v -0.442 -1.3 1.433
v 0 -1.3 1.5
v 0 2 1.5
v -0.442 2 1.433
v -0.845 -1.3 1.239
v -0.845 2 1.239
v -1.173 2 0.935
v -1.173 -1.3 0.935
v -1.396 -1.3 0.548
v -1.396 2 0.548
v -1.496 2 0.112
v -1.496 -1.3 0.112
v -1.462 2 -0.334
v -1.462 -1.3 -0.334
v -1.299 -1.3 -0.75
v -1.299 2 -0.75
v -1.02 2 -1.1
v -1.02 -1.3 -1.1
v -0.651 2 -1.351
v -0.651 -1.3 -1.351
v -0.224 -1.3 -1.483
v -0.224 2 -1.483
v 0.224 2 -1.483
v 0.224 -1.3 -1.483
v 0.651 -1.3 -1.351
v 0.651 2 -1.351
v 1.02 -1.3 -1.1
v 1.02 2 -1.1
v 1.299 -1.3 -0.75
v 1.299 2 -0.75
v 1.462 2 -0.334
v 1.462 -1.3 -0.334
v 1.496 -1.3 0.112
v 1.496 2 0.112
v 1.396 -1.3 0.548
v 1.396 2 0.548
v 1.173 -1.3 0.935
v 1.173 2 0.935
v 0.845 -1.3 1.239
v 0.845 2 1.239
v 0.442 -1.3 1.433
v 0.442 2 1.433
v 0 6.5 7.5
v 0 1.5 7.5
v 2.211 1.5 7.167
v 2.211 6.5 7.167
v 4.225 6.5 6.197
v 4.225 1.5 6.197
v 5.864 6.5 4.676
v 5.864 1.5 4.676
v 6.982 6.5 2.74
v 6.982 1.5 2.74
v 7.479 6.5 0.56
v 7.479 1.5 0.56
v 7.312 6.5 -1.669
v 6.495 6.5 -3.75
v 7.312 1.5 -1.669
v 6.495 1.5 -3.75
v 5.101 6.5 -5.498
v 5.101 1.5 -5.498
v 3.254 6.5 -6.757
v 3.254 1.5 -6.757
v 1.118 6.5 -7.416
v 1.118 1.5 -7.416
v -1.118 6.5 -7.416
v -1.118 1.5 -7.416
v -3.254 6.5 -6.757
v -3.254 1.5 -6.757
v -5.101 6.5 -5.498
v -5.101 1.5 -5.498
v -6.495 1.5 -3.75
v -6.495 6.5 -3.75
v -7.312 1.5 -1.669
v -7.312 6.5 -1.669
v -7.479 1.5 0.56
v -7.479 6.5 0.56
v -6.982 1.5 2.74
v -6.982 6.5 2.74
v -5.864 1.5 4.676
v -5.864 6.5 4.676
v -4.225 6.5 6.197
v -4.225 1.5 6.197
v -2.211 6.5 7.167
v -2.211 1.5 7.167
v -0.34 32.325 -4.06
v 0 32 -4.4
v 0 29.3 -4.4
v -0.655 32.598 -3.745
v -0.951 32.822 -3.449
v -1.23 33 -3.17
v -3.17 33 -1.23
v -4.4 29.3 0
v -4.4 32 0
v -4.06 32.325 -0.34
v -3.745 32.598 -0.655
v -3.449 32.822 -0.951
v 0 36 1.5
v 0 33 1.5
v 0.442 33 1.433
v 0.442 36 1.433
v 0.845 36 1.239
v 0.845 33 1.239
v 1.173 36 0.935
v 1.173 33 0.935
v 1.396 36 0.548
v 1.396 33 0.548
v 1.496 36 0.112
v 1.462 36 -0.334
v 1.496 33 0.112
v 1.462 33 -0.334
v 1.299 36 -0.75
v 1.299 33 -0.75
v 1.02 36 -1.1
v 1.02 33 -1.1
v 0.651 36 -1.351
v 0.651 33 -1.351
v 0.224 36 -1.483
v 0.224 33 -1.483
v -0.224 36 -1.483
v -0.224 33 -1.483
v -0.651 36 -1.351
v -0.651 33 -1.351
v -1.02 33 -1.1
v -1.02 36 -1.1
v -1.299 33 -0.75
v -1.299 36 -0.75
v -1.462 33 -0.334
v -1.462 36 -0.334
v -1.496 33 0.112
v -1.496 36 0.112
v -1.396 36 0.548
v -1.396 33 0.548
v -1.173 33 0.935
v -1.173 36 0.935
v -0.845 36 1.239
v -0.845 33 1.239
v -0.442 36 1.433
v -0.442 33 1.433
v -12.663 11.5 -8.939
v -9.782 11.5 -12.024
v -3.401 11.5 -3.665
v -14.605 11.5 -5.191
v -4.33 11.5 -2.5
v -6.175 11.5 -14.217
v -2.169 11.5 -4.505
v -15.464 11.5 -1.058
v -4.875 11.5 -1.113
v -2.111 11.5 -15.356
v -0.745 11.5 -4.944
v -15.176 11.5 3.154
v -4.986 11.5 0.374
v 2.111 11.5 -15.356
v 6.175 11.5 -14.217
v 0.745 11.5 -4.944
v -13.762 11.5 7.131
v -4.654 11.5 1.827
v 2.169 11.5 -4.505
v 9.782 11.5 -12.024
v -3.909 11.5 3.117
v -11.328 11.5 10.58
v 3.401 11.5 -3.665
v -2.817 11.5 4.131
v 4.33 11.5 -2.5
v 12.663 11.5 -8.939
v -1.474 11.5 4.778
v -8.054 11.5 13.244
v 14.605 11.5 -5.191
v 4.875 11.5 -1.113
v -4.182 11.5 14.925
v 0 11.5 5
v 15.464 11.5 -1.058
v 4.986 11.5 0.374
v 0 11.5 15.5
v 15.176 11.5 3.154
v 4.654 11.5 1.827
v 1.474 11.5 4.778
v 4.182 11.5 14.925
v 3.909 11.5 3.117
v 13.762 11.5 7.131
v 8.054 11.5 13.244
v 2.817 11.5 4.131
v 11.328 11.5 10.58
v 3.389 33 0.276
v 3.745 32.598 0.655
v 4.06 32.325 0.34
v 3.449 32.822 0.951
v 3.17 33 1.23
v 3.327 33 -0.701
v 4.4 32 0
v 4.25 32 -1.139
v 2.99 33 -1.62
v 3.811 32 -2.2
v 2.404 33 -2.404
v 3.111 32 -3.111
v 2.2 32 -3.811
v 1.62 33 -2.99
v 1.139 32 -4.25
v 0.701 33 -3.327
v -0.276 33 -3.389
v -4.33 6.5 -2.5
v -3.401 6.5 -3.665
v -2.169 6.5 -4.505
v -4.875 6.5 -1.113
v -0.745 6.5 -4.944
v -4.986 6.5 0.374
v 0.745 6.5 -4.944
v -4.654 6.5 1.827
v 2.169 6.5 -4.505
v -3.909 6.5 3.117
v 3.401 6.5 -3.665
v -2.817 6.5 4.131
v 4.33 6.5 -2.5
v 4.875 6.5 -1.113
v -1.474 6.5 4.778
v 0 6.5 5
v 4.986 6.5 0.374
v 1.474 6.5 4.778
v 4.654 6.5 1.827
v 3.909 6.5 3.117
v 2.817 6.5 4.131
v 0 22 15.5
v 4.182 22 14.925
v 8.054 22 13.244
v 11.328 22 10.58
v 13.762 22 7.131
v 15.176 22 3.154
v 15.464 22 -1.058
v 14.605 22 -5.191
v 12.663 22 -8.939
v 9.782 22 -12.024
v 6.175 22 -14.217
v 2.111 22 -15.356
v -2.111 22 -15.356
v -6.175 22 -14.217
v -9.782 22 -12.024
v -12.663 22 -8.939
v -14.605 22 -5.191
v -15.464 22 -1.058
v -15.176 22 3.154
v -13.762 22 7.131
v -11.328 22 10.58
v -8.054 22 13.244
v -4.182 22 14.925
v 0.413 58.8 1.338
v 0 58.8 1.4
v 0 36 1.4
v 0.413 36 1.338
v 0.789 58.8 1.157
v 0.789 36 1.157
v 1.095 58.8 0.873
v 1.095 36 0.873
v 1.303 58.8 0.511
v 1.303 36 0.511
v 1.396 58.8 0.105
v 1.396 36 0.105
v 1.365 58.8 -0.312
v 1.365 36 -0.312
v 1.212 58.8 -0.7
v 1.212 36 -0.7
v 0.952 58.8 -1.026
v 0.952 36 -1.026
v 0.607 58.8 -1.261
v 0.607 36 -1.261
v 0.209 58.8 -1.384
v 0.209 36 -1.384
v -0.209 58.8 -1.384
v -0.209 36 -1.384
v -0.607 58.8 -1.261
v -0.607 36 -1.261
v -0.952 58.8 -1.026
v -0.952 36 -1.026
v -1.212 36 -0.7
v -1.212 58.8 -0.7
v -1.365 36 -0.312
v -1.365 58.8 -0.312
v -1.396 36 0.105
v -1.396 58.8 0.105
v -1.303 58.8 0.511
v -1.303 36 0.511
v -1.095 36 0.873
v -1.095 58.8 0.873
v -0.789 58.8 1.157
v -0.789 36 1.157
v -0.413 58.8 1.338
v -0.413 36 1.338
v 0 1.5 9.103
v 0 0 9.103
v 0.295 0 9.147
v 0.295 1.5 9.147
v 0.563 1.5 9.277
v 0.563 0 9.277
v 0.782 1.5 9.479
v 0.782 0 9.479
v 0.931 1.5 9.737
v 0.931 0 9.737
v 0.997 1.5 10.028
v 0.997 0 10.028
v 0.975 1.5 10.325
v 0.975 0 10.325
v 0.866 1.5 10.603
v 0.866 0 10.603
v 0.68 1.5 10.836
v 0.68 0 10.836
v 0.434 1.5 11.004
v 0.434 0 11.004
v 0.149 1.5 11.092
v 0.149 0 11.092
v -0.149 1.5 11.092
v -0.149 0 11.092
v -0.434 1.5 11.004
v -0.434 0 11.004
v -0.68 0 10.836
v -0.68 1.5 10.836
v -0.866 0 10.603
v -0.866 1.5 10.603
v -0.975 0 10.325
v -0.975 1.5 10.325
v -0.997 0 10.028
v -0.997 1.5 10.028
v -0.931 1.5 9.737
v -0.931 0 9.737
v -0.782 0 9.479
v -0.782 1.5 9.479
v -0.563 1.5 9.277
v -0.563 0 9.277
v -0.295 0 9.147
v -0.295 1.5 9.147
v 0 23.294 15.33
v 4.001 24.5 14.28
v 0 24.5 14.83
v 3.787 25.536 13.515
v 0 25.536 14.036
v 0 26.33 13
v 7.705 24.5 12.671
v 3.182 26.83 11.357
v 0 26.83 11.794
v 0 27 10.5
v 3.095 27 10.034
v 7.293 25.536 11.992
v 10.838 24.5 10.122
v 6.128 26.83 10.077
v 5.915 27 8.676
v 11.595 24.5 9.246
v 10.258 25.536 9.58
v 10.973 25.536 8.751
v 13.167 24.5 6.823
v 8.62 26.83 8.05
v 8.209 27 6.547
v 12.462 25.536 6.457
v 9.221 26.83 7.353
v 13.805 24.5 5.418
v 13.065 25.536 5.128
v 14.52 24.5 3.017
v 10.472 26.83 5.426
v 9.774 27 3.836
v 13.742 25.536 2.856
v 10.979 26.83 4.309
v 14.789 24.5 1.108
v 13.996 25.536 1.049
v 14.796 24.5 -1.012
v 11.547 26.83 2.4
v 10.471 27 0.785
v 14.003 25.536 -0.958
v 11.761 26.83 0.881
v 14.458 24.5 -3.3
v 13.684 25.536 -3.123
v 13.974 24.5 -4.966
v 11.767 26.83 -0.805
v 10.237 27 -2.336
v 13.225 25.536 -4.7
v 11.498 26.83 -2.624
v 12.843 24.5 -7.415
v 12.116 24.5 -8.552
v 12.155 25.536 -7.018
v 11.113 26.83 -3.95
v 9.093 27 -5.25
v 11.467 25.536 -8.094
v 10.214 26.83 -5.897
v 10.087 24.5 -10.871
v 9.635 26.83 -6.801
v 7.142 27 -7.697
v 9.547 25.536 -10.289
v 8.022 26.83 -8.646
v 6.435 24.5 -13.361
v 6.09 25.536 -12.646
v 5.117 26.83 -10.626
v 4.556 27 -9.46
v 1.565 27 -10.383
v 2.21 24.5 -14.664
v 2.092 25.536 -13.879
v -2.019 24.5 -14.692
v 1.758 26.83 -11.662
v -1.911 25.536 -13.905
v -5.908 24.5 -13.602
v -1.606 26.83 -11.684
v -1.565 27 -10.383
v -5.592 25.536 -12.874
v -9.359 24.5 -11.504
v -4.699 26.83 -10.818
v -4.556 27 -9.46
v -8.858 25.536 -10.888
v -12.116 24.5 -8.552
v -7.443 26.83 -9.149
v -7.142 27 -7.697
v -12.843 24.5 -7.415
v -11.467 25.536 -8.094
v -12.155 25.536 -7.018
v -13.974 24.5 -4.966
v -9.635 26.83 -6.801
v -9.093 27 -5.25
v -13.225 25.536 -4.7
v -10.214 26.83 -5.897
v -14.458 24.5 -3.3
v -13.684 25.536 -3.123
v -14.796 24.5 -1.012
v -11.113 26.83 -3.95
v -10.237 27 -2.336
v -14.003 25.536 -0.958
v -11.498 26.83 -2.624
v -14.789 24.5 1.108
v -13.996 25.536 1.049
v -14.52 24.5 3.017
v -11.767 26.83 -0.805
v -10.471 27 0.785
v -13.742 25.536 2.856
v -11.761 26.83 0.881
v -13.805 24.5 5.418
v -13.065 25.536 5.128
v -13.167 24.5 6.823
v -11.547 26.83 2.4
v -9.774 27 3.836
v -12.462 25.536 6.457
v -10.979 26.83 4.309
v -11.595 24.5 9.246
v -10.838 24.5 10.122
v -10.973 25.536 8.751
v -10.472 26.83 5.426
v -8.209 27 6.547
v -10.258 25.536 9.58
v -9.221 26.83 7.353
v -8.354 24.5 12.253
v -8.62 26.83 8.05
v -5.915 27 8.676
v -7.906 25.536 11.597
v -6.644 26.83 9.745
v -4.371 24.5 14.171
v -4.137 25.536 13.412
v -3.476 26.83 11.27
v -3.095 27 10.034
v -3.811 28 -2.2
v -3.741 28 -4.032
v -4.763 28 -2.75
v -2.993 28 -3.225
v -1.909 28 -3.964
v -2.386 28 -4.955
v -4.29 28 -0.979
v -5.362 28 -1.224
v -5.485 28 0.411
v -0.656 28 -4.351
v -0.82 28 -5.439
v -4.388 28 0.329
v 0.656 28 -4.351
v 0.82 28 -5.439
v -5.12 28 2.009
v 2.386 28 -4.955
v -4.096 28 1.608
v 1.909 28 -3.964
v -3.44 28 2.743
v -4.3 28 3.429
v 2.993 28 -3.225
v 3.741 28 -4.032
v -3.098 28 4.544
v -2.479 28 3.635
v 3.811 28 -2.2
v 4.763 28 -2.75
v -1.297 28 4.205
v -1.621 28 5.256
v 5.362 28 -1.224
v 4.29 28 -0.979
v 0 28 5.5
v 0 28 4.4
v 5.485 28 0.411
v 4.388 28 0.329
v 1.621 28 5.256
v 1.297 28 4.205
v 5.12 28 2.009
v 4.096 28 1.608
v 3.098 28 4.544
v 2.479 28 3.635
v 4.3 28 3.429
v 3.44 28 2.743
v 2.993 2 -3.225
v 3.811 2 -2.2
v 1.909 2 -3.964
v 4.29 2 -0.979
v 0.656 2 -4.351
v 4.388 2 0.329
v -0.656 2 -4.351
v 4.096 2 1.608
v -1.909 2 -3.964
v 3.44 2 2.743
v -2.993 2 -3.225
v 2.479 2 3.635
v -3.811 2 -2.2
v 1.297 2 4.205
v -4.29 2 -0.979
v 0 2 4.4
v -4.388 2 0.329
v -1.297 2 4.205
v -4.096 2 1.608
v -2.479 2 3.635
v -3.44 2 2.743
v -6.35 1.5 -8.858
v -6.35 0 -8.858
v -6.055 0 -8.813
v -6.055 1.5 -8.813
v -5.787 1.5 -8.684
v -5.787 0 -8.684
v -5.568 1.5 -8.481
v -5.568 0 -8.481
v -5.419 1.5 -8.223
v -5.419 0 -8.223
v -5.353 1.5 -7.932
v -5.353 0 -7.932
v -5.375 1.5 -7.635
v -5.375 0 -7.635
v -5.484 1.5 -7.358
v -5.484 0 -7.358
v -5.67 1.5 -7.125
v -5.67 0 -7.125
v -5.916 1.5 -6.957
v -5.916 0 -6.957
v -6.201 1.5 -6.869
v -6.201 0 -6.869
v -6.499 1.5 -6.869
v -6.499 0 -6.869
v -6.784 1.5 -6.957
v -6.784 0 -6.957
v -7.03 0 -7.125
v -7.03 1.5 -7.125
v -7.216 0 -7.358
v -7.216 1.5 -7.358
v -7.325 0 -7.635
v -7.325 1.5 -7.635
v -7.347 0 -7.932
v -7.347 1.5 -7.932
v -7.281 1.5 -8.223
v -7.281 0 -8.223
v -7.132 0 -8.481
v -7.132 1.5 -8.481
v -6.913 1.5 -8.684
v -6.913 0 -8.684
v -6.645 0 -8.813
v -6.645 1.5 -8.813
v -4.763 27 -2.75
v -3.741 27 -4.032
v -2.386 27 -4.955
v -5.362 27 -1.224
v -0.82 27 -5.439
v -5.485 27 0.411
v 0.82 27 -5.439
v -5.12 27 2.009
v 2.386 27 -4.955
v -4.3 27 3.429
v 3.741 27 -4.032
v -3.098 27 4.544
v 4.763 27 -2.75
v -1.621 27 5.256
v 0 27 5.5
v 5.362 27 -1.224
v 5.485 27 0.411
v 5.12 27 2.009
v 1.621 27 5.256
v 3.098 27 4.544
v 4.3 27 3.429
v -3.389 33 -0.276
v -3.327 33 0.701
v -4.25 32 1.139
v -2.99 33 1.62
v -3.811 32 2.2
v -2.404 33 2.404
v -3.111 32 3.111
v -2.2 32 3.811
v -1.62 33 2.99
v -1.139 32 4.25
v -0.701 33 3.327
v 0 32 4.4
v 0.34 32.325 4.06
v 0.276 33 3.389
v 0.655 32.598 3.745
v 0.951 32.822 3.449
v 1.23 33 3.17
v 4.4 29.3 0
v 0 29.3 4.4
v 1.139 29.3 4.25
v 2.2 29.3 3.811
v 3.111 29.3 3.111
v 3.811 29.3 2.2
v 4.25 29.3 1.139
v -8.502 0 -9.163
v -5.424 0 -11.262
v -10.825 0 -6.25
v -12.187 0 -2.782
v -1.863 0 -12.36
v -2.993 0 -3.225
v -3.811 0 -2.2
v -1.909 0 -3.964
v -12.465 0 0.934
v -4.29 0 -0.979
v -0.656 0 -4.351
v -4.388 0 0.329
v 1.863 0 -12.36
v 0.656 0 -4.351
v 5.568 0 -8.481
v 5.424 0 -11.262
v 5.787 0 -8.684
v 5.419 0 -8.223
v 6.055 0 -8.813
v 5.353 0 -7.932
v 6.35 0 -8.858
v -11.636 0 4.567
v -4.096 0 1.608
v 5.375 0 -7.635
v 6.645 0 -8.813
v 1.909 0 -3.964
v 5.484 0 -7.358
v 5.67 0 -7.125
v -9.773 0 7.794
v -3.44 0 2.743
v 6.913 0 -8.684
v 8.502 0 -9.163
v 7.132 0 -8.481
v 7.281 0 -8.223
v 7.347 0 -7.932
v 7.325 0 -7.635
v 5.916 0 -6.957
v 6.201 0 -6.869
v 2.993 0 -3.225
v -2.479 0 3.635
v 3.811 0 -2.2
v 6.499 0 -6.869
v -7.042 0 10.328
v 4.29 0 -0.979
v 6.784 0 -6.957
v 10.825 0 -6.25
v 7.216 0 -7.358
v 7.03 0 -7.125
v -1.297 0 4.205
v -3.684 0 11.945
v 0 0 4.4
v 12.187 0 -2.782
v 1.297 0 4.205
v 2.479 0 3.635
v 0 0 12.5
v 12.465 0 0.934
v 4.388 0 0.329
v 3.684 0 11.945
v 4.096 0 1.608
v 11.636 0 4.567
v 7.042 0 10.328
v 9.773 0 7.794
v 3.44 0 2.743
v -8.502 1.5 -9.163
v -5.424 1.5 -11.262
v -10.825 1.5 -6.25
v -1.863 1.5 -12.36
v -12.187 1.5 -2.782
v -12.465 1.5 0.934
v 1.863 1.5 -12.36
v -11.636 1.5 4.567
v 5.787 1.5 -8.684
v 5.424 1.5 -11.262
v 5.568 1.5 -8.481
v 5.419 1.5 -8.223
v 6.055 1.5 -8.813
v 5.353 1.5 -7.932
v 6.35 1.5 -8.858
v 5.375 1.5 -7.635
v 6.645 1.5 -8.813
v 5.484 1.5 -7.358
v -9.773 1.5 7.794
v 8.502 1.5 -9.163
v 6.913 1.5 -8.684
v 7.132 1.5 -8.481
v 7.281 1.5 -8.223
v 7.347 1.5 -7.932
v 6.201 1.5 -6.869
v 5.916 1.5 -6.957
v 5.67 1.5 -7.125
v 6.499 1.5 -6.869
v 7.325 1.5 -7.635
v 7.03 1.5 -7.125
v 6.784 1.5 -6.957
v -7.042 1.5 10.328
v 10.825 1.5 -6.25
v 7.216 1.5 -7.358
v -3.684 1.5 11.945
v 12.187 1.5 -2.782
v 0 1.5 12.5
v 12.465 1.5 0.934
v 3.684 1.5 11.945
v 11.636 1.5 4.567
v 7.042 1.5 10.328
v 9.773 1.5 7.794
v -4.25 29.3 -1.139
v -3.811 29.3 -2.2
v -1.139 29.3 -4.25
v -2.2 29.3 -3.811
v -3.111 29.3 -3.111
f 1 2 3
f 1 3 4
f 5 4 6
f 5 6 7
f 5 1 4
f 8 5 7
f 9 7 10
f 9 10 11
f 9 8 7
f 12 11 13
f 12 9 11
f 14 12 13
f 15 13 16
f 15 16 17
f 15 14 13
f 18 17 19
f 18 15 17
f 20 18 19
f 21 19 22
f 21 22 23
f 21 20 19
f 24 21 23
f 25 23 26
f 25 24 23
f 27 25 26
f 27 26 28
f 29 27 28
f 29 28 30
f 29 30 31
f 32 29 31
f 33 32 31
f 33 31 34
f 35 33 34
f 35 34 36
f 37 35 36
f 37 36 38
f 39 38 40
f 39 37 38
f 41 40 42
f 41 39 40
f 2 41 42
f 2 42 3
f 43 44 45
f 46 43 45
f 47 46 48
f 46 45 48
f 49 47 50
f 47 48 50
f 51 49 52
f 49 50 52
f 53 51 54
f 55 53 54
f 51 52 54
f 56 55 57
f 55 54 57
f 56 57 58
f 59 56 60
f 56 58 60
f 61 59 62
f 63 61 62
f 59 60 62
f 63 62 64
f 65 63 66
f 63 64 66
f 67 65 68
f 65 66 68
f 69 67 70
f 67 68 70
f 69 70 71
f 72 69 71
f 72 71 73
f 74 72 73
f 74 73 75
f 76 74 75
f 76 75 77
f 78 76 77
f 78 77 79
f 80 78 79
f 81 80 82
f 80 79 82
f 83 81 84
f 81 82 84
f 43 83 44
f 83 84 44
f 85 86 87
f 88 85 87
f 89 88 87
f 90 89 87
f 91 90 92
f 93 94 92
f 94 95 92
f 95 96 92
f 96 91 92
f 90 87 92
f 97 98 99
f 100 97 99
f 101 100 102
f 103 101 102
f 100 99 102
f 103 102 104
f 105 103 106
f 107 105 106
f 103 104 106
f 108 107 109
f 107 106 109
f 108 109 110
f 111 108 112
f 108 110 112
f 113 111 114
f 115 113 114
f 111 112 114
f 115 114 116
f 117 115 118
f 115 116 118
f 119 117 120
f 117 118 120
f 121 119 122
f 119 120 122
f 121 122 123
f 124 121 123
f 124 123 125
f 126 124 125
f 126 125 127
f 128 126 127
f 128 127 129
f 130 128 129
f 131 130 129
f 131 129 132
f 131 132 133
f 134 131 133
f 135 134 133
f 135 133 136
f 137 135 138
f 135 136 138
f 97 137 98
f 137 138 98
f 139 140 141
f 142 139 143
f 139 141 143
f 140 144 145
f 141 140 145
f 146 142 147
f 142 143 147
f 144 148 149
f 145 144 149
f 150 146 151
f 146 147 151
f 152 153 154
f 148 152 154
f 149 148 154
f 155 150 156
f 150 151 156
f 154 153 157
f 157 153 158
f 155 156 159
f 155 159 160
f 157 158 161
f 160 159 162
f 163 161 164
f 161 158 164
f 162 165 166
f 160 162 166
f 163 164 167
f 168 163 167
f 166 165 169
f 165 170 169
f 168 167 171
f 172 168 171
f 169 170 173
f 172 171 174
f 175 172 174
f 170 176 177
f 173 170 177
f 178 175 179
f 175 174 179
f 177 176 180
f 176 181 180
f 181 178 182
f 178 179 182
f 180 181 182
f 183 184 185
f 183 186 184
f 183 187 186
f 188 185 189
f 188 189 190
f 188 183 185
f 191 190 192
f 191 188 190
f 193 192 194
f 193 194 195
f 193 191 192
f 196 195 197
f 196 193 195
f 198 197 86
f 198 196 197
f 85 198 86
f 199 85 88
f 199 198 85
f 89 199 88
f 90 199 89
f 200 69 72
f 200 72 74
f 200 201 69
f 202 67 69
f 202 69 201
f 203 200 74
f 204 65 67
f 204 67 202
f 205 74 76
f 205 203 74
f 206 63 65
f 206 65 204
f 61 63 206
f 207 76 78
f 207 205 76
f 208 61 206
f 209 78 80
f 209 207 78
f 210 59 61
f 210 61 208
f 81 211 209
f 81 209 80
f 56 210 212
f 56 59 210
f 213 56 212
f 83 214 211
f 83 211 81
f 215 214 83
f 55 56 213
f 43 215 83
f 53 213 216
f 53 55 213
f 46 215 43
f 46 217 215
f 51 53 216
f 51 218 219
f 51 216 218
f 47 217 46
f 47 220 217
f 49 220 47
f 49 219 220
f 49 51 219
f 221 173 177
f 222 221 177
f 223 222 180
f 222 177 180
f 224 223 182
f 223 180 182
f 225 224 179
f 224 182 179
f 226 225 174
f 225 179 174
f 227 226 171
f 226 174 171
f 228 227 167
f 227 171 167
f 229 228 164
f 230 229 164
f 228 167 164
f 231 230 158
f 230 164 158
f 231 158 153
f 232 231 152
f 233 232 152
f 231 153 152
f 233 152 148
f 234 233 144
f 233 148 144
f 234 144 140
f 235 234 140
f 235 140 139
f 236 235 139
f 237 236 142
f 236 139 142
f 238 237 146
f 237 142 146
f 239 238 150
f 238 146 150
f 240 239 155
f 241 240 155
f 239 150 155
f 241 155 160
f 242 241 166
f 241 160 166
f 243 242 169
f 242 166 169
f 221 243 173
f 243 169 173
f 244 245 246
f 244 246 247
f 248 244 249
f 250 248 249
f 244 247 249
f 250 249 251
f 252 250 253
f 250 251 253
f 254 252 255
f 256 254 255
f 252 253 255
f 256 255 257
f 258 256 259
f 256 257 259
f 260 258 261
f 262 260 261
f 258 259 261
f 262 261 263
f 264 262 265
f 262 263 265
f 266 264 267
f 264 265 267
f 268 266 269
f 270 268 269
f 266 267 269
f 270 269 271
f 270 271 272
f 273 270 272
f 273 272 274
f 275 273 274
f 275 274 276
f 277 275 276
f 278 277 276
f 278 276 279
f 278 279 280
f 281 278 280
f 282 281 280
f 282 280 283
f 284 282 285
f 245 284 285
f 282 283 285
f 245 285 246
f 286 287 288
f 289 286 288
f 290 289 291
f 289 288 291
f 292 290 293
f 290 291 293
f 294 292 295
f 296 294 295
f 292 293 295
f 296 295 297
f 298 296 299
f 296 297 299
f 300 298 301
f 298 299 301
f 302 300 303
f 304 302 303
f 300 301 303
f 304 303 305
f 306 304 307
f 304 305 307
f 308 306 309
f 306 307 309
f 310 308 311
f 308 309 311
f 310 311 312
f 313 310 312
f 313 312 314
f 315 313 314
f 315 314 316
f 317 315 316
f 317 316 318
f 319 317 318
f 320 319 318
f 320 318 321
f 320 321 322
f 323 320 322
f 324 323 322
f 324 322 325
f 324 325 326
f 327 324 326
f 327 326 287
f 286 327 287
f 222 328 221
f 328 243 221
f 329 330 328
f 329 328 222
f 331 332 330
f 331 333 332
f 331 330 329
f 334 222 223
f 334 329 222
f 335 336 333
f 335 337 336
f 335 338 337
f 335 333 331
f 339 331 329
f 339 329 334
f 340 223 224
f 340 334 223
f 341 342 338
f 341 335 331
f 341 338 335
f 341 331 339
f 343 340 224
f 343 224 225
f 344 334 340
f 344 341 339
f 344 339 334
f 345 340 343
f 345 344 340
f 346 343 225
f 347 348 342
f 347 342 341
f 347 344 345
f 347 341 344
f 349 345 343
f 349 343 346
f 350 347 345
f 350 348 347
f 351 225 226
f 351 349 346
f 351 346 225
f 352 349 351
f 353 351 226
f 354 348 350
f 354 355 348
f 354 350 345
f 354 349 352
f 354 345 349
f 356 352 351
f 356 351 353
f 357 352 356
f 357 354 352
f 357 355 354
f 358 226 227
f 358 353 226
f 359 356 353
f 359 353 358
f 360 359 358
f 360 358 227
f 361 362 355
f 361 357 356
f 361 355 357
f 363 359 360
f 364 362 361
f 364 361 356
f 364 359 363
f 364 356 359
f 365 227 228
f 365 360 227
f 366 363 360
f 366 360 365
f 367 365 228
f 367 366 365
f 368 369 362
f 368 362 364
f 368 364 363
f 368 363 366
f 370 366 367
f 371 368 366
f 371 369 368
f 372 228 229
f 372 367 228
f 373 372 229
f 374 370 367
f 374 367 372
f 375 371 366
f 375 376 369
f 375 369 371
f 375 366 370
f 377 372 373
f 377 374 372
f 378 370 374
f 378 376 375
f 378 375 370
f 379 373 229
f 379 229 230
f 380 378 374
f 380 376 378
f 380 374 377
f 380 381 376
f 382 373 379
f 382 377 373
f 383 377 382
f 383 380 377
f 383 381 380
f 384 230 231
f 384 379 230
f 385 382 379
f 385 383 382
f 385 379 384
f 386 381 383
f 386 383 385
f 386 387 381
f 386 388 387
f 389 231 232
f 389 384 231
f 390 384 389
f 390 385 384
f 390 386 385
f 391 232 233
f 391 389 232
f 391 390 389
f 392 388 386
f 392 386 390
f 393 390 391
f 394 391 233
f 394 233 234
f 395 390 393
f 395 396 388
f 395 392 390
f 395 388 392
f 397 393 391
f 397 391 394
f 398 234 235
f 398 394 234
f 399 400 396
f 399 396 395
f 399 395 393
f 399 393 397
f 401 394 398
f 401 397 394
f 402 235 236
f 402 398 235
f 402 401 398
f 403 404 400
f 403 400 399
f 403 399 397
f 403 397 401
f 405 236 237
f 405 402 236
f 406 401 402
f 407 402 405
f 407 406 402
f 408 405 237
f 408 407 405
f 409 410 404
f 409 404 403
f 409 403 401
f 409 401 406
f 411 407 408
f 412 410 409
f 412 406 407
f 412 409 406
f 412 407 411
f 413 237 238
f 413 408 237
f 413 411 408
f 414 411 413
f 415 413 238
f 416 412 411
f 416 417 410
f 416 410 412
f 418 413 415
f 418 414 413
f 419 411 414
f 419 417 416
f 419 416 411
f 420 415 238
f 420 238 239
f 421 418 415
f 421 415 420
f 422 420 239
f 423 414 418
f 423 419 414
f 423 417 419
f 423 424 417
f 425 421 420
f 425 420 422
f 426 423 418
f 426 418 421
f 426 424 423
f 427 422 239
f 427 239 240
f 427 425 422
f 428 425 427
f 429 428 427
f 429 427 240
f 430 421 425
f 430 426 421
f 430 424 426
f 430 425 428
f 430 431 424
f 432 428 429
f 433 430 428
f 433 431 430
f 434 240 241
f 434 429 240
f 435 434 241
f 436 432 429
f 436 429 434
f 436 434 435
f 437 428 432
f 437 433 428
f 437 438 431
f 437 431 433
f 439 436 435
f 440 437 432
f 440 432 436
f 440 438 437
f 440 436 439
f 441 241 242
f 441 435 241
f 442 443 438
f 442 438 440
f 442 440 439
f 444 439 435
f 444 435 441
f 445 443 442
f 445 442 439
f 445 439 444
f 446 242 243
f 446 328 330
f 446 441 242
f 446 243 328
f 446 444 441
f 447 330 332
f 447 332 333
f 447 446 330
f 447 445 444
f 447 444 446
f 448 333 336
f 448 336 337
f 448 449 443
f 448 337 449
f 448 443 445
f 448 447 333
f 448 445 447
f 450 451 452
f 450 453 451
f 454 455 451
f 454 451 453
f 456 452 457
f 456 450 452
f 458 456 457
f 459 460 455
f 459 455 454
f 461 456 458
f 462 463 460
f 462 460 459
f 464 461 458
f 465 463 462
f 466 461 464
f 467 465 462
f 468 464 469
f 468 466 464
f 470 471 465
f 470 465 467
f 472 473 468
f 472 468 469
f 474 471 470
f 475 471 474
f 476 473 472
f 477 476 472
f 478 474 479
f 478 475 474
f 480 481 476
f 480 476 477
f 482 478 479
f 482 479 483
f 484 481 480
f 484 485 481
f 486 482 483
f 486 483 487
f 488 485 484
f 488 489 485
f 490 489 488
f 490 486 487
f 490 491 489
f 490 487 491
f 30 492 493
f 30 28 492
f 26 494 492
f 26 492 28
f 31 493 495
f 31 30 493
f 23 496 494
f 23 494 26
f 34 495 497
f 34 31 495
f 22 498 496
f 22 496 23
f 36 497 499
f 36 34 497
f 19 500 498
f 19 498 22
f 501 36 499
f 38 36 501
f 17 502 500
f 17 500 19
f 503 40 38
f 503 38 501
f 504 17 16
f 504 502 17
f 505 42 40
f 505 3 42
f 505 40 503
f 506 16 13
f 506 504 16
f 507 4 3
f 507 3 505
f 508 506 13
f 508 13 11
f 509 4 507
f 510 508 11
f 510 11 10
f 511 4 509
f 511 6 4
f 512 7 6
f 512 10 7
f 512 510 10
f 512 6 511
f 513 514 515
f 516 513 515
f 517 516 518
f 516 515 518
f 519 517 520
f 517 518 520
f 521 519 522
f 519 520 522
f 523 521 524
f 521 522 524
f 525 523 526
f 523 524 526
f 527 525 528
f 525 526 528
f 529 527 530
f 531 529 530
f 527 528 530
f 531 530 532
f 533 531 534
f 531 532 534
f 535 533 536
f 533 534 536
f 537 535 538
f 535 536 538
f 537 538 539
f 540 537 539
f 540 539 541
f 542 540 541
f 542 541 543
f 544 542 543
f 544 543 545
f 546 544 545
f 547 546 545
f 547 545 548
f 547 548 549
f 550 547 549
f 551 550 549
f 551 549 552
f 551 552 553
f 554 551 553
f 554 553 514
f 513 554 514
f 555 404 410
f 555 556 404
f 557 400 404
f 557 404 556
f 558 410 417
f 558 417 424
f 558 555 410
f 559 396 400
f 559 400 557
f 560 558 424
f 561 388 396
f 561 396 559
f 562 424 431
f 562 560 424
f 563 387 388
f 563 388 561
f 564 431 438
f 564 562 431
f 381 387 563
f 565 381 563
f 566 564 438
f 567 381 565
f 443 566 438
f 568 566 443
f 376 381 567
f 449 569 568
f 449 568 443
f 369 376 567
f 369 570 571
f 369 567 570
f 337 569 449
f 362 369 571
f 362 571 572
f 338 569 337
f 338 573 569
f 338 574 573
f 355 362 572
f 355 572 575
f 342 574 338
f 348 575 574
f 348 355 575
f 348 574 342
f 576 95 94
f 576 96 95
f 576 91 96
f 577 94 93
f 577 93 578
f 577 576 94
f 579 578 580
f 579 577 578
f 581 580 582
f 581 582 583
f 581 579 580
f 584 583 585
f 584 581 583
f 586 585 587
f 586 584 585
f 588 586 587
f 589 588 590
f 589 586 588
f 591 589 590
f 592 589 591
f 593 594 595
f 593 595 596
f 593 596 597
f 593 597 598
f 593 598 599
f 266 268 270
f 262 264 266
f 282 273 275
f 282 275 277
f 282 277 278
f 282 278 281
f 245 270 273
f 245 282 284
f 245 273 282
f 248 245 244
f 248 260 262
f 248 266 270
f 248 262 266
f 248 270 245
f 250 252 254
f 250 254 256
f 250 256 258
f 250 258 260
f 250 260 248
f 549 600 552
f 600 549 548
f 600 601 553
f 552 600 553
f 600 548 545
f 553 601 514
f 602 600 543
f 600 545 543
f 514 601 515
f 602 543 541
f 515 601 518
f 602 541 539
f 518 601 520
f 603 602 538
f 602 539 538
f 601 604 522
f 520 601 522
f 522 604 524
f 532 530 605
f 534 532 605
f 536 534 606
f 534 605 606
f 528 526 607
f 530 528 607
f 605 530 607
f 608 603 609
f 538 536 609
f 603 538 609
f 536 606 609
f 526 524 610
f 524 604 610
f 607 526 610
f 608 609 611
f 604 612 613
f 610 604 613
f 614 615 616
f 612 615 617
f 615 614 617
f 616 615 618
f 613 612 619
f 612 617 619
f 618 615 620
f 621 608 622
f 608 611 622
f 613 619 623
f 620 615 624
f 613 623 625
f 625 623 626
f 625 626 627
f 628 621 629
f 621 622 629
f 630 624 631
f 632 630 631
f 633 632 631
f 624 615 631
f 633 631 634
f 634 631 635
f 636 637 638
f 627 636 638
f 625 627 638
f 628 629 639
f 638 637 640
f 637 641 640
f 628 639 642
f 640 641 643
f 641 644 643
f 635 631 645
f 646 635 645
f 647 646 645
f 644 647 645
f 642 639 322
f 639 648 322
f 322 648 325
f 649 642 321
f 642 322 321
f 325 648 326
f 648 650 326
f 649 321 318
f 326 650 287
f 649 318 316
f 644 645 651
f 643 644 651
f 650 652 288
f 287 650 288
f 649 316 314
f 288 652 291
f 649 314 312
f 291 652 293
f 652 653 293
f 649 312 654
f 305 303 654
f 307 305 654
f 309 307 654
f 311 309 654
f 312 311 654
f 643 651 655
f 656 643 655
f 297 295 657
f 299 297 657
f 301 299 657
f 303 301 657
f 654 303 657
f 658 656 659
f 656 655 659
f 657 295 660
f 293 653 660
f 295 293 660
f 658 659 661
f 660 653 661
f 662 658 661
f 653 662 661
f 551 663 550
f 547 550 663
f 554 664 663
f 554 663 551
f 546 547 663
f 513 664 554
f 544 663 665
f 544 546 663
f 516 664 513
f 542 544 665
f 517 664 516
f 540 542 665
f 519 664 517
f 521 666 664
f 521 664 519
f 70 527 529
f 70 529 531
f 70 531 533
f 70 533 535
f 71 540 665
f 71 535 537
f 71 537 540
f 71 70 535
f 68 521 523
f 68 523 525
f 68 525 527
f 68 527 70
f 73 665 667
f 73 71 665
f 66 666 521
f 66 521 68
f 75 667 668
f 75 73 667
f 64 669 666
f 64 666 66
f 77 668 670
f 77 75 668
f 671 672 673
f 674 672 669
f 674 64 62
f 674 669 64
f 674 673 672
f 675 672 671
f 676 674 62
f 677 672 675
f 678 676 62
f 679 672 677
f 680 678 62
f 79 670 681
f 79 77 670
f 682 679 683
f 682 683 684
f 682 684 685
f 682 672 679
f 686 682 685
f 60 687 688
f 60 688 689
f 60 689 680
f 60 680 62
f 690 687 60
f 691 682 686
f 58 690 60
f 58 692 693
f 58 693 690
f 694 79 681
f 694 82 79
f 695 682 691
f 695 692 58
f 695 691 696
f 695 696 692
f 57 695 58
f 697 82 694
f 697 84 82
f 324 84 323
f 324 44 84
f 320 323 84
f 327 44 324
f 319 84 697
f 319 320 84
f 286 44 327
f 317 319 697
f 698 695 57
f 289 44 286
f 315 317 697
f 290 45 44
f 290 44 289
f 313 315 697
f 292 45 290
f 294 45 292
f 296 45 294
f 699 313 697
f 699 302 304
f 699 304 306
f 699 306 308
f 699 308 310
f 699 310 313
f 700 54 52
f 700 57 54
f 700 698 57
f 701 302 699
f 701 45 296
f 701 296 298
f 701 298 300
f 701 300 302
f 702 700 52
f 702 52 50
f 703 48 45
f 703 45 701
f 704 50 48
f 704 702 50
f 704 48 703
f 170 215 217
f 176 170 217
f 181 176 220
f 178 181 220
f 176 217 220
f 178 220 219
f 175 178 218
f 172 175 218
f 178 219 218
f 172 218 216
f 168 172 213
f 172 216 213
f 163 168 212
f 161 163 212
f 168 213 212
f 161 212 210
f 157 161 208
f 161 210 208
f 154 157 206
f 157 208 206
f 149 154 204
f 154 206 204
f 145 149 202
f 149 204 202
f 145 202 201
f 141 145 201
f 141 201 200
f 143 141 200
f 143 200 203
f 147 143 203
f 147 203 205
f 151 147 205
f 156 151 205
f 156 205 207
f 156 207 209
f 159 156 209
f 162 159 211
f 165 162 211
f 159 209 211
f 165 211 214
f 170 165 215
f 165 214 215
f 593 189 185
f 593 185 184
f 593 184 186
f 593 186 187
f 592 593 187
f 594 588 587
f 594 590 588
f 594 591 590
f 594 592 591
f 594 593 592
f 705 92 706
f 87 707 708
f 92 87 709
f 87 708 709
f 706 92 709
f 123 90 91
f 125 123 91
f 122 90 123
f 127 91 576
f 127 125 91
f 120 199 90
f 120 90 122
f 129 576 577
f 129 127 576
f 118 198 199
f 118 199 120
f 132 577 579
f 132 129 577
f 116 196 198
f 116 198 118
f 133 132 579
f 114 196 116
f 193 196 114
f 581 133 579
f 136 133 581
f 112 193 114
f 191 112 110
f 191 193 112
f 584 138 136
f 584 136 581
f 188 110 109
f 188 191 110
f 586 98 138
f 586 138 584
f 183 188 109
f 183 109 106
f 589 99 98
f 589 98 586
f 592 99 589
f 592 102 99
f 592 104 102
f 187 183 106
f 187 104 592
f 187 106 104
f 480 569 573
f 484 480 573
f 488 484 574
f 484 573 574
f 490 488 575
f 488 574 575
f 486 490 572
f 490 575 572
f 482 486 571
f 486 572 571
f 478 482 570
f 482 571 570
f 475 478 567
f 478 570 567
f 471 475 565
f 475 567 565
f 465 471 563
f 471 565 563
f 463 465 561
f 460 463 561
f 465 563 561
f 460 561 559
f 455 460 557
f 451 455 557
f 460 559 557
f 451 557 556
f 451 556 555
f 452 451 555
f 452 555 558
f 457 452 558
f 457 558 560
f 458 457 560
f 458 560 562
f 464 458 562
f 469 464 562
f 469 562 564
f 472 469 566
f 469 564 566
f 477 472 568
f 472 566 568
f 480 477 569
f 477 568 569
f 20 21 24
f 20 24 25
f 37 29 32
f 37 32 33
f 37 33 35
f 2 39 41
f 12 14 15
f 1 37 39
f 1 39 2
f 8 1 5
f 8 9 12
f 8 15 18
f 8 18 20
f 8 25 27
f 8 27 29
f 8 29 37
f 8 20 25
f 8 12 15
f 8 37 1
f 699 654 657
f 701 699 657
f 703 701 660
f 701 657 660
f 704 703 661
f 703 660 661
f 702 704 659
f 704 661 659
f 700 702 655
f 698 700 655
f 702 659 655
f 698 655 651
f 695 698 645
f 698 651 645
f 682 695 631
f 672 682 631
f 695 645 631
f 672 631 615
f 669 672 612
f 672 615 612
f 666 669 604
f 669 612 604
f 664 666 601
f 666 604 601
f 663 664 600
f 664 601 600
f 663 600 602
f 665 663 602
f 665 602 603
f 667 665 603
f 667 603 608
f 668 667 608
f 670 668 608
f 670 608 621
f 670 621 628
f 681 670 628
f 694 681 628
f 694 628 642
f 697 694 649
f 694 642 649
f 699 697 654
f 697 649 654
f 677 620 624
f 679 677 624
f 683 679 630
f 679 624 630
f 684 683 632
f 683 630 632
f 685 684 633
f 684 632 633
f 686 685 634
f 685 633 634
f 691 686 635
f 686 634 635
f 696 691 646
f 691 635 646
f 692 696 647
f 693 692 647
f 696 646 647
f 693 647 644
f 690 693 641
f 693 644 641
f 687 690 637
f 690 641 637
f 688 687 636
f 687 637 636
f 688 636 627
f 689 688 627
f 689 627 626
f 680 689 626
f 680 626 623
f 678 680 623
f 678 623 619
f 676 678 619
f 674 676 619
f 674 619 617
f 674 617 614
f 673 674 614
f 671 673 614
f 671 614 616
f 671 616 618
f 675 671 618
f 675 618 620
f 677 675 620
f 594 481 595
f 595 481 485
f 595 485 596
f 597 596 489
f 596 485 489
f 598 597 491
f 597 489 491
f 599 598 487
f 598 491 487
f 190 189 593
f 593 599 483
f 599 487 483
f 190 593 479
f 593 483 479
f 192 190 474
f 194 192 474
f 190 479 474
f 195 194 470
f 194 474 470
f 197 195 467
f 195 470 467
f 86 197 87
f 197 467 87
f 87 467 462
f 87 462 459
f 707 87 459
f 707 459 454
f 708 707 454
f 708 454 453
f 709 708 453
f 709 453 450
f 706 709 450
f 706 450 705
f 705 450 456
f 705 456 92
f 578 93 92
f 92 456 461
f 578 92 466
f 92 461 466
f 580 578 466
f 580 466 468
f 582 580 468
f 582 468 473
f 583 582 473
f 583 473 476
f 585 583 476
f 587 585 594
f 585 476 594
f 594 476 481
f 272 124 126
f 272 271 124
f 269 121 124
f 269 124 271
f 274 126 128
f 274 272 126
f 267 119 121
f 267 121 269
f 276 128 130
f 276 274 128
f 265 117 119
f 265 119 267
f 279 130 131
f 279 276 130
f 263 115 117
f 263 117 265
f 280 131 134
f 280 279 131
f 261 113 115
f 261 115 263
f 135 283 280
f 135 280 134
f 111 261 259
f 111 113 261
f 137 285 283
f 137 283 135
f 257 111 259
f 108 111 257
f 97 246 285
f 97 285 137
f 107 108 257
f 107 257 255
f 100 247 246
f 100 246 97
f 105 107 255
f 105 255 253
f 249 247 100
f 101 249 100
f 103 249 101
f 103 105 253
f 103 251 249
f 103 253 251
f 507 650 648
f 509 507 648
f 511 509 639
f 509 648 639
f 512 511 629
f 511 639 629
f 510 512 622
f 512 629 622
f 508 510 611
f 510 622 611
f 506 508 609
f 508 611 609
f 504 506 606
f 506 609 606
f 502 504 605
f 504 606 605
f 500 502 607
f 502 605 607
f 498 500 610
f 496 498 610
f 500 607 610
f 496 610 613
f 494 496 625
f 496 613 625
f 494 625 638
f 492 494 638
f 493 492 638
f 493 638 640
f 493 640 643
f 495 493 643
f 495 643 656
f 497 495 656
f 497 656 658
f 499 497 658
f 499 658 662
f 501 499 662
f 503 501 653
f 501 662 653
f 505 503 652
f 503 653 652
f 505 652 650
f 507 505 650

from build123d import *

# Parameters (mm, degrees)
SKETCH1_R       = 12.5
EXTRUDE1_DEPTH  = 1.5
SKETCH2_R       = 7.5
EXTRUDE2_DEPTH  = 5
SKETCH3_R       = 5
EXTRUDE3_DEPTH  = 5
SKETCH4_R       = 15.5
EXTRUDE4_DEPTH  = 15.5
SKETCH5_R       = 5.5
EXTRUDE5_DEPTH  = 1
SKETCH6_R       = 4.4
EXTRUDE6_DEPTH  = 5
EXTRUDE7_START  = -3.7
EXTRUDE7_DEPTH  = 3.7
SKETCH8_R       = 1.5
EXTRUDE8_DEPTH  = 3
SKETCH9_R       = 1.4
EXTRUDE9_DEPTH  = 22.8
SKETCH10_R      = 4.4
EXTRUDE10_DEPTH = 2
EXTRUDE11_START = 3.3
SKETCH11_R      = 1.5
EXTRUDE11_DEPTH = 3.3
EXTRUDE12_REACH = 64.753
SKETCH12_R      = 1
FILLET1_R       = 5
CHAMFER1_SIZE   = 1


with BuildPart() as part:
    # Sketch1 → Extrude1 (new body)
    with BuildSketch(Plane(origin=(0, 0, 0), x_dir=(1, 0, 0), z_dir=(0, 1, 0))):
        with Locations(Location((0, 0, 0), (0, 0, 270))):
            Circle(SKETCH1_R)
    extrude(amount=EXTRUDE1_DEPTH)

    # Sketch2 → Extrude2 (add)
    with BuildSketch(Plane(origin=(0, 1.5, 0), x_dir=(1, 0, 0), z_dir=(0, 1, 0))):
        with Locations(Location((0, 0, 0), (0, 0, 270))):
            Circle(SKETCH2_R)
    extrude(amount=EXTRUDE2_DEPTH)

    # Sketch3 → Extrude3 (add)
    with BuildSketch(Plane(origin=(0, 6.5, 0), x_dir=(1, 0, 0), z_dir=(0, 1, 0))):
        with Locations(Location((0, 0, 0), (0, 0, 270))):
            Circle(SKETCH3_R)
    extrude(amount=EXTRUDE3_DEPTH)

    # Sketch4 → Extrude4 (add)
    with BuildSketch(Plane(origin=(0, 11.5, 0), x_dir=(1, 0, 0), z_dir=(0, 1, 0))):
        with Locations(Location((0, 0, 0), (0, 0, 270))):
            Circle(SKETCH4_R)
    extrude(amount=EXTRUDE4_DEPTH)

    # Sketch5 → Extrude5 (add)
    with BuildSketch(Plane(origin=(0, 27, 0), x_dir=(1, 0, 0), z_dir=(0, 1, 0))):
        with Locations(Location((0, 0, 0), (0, 0, 270))):
            Circle(SKETCH5_R)
    extrude(amount=EXTRUDE5_DEPTH)

    # Sketch6 → Extrude6 (add)
    with BuildSketch(Plane(origin=(0, 28, 0), x_dir=(1, 0, 0), z_dir=(0, 1, 0))):
        with Locations(Location((0, 0, 0), (0, 0, 270))):
            Circle(SKETCH6_R)
    extrude(amount=EXTRUDE6_DEPTH)

    # Sketch7 → Extrude7 (cut)
    with BuildSketch(Plane(origin=(0, 33, 0), x_dir=(1, 0, 0), z_dir=(0, 1, 0)).offset(EXTRUDE7_START)):
        with BuildLine():
            Line((0, 4.4), (-4.4, 0))
            ThreePointArc((-4.4, 0), (-3.111269837, 3.111269837), (0, 4.4))
        make_face()
        with BuildLine():
            Line((4.4, 0), (0, -4.4))
            ThreePointArc((0, -4.4), (3.111269837, -3.111269837), (4.4, 0))
        make_face()
    extrude(amount=EXTRUDE7_DEPTH, mode=Mode.SUBTRACT)

    # Sketch8 → Extrude8 (add)
    with BuildSketch(Plane(origin=(0, 33, 0), x_dir=(1, 0, 0), z_dir=(0, 1, 0))):
        with Locations(Location((0, 0, 0), (0, 0, 270))):
            Circle(SKETCH8_R)
    extrude(amount=EXTRUDE8_DEPTH)

    # Sketch9 → Extrude9 (add)
    with BuildSketch(Plane(origin=(0, 36, 0), x_dir=(1, 0, 0), z_dir=(0, 1, 0))):
        with Locations(Location((0, 0, 0), (0, 0, 270))):
            Circle(SKETCH9_R)
    extrude(amount=EXTRUDE9_DEPTH)

    # Sketch10 → Extrude10 (cut)
    with BuildSketch(Plane.XZ):
        with Locations(Location((0, 0, 0), (0, 0, 90))):
            Circle(SKETCH10_R)
    extrude(amount=-EXTRUDE10_DEPTH, mode=Mode.SUBTRACT)

    # Sketch11 → Extrude11 (add)
    with BuildSketch(Plane.XZ.offset(-2).offset(EXTRUDE11_START)):
        with Locations(Location((0, 0, 0), (0, 0, 90))):
            Circle(SKETCH11_R)
    extrude(amount=-EXTRUDE11_DEPTH)

    # Sketch12 → Extrude12 (cut, up to next)
    with BuildSketch(Plane.XZ, mode=Mode.PRIVATE) as extrude12_sk1:
        with Locations(Location((0, 10.102788136, 0), (0, 0, 270))):
            Circle(SKETCH12_R)
    extrude12_tool1 = extrude(extrude12_sk1.sketch, amount=-EXTRUDE12_REACH, mode=Mode.PRIVATE) & part.part
    # Sketch12 → Extrude12 (cut, up to next)
    with BuildSketch(Plane.XZ, mode=Mode.PRIVATE) as extrude12_sk2:
        with Locations(Location((-6.35, -7.857724106, 0), (0, 0, 270))):
            Circle(SKETCH12_R)
    extrude12_tool2 = extrude(extrude12_sk2.sketch, amount=-EXTRUDE12_REACH, mode=Mode.PRIVATE) & part.part
    # Sketch12 → Extrude12 (cut, up to next)
    with BuildSketch(Plane.XZ, mode=Mode.PRIVATE) as extrude12_sk3:
        with Locations(Location((6.35, -7.857724106, 0), (0, 0, 270))):
            Circle(SKETCH12_R)
    extrude12_tool3 = extrude(extrude12_sk3.sketch, amount=-EXTRUDE12_REACH, mode=Mode.PRIVATE) & part.part
    add(extrude12_tool1.solids().sort_by_distance((0, 0, 10.102788))[0], mode=Mode.SUBTRACT)
    add(extrude12_tool2.solids().sort_by_distance((-6.35, 0, -7.857724))[0], mode=Mode.SUBTRACT)
    add(extrude12_tool3.solids().sort_by_distance((6.35, 0, -7.857724))[0], mode=Mode.SUBTRACT)

    # Fillet1
    fillet1_edges = [part.edges().sort_by_distance(p)[0] for p in [
        (0, 27, -15.5),
    ]]
    fillet(fillet1_edges, radius=FILLET1_R)

    # Chamfer1
    chamfer1_edges = [part.edges().sort_by_distance(p)[0] for p in [
        (-3.111269837, 33, 3.111269837),
        (3.111269837, 33, -3.111269837),
    ]]
    chamfer(chamfer1_edges, length=CHAMFER1_SIZE)


solid = part.part
